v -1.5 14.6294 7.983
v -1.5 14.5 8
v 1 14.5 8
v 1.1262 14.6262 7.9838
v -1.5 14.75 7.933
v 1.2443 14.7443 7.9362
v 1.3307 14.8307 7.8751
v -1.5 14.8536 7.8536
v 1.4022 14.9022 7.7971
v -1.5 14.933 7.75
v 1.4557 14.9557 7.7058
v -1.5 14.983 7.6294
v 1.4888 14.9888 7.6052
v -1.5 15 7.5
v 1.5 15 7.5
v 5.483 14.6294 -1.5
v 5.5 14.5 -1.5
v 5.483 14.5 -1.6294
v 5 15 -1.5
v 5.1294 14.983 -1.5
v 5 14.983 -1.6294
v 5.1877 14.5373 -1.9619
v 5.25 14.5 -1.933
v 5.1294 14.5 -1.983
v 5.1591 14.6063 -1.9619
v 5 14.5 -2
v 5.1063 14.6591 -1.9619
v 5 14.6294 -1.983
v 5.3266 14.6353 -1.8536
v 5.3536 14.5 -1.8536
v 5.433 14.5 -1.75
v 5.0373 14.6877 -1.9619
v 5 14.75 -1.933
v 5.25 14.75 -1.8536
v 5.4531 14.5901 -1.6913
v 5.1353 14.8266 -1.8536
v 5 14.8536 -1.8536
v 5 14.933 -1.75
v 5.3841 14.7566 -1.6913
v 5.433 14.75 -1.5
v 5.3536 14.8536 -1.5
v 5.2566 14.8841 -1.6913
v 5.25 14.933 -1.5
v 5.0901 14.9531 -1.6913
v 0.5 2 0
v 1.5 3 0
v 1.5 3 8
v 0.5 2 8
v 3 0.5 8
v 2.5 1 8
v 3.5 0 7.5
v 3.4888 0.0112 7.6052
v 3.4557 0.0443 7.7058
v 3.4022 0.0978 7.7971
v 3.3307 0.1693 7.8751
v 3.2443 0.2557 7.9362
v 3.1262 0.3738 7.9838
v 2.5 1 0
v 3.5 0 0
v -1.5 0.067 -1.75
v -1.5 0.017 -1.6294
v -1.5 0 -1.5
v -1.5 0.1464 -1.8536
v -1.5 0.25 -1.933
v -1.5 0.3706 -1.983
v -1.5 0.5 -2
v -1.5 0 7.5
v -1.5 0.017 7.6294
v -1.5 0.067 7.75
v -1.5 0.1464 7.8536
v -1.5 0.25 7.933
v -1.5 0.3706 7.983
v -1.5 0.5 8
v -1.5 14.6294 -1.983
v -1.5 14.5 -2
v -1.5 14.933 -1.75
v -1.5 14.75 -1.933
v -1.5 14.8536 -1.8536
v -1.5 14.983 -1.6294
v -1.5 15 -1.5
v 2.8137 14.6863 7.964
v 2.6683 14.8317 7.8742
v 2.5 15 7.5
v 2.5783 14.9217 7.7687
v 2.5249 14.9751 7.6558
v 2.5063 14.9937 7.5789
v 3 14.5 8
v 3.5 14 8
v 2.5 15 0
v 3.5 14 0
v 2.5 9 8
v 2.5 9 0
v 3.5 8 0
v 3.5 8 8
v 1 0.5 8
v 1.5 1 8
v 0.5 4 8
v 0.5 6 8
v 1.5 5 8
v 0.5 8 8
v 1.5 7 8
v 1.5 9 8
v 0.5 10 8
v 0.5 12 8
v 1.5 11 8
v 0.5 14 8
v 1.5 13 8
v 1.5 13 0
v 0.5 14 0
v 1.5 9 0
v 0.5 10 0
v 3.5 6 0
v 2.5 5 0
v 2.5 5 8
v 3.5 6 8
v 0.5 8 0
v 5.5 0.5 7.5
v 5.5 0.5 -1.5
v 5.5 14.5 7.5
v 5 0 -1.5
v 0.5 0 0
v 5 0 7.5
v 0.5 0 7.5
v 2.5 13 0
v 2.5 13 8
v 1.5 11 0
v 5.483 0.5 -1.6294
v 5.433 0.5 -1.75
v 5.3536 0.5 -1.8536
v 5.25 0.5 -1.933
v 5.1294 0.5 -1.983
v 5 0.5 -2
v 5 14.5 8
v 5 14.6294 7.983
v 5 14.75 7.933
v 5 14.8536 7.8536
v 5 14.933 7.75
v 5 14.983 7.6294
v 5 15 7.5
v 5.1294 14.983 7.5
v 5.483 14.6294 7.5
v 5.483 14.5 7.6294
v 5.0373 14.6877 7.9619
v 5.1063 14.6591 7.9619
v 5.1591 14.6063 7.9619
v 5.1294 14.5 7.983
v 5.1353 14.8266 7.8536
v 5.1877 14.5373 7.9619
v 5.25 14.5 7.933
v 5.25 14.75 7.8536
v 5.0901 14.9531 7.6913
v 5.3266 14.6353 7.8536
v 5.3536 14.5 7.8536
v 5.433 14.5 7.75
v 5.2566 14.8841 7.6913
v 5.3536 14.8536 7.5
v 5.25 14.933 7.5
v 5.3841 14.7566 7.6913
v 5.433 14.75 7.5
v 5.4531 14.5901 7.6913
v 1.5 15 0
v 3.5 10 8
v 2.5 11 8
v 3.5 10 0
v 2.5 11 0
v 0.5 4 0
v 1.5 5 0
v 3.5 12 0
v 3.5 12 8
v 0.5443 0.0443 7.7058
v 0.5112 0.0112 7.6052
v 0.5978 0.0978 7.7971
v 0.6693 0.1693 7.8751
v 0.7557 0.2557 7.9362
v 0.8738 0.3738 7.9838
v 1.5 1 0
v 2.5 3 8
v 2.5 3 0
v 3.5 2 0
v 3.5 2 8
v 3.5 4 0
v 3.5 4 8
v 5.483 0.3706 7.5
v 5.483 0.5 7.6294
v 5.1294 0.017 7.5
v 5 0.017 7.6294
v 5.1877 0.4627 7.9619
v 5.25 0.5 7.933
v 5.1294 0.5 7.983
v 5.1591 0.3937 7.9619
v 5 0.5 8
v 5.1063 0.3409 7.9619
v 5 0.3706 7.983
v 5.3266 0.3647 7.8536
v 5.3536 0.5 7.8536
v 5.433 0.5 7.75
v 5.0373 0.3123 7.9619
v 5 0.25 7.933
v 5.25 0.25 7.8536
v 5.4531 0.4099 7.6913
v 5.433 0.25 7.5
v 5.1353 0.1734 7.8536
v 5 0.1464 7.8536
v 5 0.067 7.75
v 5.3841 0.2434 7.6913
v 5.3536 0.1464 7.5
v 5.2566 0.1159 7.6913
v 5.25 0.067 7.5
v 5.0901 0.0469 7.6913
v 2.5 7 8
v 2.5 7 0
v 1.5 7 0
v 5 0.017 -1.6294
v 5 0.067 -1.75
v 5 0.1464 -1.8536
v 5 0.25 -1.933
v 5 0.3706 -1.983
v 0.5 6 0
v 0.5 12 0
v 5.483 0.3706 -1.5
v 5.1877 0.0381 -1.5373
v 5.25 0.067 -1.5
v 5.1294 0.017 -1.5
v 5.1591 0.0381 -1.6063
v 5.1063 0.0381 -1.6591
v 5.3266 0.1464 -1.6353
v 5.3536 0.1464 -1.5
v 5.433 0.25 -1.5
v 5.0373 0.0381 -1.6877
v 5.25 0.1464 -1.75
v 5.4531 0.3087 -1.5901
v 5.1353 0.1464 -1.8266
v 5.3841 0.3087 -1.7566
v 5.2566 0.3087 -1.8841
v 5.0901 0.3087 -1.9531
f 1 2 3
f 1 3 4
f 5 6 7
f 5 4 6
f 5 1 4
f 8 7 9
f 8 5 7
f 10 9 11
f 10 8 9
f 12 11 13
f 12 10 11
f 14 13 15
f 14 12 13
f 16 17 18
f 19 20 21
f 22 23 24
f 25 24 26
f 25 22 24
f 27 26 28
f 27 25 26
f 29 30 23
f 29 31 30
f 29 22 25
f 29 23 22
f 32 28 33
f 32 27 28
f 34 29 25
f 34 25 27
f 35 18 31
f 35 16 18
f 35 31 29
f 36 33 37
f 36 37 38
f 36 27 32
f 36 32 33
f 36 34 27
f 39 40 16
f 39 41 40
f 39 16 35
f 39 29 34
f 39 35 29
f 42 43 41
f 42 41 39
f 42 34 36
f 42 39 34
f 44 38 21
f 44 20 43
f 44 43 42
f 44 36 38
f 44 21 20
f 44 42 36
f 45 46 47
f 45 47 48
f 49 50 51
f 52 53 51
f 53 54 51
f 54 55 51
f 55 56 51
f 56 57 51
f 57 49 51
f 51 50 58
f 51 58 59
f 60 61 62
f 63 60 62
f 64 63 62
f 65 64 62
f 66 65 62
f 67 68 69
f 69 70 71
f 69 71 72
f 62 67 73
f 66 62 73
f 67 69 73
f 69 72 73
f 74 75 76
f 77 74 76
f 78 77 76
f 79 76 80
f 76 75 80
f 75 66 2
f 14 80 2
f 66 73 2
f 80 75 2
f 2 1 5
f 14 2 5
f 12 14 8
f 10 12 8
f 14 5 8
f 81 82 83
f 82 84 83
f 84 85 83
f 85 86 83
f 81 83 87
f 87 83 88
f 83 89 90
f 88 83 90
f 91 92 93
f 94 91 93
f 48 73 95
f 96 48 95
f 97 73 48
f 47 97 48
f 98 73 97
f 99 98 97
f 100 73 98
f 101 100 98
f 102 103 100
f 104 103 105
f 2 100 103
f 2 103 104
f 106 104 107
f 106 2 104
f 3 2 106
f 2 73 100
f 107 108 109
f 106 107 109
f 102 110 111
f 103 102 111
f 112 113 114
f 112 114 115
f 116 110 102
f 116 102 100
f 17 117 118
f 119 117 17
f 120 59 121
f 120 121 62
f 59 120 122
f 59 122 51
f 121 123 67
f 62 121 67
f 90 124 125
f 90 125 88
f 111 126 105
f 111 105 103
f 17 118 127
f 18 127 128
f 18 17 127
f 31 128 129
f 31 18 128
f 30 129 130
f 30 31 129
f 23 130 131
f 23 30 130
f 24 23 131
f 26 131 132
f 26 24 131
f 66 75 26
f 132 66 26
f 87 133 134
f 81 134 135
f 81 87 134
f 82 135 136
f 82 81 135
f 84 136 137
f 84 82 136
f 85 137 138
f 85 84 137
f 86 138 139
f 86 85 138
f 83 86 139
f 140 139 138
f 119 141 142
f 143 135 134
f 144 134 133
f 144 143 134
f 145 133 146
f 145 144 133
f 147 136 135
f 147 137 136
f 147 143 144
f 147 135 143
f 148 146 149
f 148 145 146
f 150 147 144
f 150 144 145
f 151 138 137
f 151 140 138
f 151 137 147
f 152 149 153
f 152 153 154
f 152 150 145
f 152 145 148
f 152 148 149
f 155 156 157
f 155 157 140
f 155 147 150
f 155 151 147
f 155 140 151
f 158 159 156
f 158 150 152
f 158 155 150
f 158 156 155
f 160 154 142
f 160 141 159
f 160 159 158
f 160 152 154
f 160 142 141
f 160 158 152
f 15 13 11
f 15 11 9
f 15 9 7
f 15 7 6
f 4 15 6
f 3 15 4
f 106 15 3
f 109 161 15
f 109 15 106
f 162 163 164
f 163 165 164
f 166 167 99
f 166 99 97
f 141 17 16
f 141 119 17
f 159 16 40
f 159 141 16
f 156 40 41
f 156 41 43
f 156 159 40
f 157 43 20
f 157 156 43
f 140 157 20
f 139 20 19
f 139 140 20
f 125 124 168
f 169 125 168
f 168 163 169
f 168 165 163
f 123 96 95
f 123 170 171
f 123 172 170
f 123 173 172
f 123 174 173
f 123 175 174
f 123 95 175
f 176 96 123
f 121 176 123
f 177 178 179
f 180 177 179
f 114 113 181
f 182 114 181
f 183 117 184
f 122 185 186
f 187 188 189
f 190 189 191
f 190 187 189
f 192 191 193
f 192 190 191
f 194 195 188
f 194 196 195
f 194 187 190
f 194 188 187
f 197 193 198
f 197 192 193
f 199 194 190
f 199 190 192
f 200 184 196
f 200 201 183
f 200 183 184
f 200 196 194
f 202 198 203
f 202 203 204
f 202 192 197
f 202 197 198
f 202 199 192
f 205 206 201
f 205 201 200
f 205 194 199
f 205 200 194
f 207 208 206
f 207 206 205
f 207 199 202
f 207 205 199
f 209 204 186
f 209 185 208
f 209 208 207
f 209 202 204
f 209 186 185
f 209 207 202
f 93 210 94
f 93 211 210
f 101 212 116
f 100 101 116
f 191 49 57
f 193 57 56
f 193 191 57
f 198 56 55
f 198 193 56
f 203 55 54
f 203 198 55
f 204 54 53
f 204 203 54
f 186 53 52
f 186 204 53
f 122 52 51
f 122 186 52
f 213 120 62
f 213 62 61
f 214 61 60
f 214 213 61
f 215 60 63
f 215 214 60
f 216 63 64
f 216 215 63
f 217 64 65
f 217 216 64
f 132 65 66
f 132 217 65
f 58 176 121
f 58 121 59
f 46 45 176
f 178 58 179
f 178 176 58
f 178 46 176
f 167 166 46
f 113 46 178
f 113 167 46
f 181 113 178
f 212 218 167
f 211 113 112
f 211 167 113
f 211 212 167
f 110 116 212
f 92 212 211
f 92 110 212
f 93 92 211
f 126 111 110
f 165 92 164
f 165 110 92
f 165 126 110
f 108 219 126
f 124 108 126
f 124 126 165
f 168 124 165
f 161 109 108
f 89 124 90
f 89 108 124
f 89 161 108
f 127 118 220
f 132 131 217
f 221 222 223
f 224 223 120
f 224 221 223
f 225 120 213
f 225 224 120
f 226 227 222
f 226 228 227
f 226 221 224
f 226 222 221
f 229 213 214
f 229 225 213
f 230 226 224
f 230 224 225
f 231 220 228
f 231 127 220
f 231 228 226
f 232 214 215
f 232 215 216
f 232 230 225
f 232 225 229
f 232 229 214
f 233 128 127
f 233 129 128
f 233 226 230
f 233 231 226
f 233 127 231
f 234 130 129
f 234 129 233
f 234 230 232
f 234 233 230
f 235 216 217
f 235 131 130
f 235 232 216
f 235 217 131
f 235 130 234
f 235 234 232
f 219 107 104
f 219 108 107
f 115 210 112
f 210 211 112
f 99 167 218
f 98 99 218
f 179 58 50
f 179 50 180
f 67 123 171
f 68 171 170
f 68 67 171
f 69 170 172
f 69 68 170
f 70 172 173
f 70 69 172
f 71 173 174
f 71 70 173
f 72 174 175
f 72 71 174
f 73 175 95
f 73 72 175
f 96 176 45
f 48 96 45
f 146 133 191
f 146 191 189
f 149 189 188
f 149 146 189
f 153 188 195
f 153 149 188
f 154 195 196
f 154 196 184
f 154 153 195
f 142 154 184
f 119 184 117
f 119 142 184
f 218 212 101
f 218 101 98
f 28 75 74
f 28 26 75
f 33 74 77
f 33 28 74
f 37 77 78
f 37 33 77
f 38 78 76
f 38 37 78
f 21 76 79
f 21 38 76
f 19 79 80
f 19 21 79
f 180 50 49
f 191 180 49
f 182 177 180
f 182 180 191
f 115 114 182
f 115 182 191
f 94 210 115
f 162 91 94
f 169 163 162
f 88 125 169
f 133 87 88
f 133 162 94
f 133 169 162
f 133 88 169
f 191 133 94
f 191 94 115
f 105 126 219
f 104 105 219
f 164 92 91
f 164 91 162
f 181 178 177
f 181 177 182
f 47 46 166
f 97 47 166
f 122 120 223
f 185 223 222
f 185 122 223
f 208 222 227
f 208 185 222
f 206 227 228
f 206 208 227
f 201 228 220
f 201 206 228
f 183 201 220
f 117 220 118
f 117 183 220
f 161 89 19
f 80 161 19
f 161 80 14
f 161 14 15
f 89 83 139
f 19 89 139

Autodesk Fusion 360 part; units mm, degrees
sketch "Esquisse1" plane through (0, 0, 0) normal (0, 0, 1) x (1, 0, 0)
  line L0 (2, 0) -> (3.5, 0)
  line L1 (3.5, 0) -> (3.5, 15)
  line L2 (3.5, 15) -> (2, 15)
  line L3 (3.5, 0) -> (5.5, 0)
  line L4 (5.5, 0) -> (5.5, 15)
  line L5 (5.5, 15) -> (3.5, 15)
  line L6 (3.5, 15) -> (3.5, 0)
  line L7 (3.5, 15) -> (2.5, 15)
  line L8 (3.5, 15) -> (3.5, 14)
  line L9 (2.5, 15) -> (3.5, 14)
  line L10 (2.5, 13) -> (3.5, 14)
  line L11 (2.5, 13) -> (3.5, 12)
  line L12 (2.5, 11) -> (3.5, 12)
  line L13 (2.5, 7) -> (3.5, 8)
  line L14 (2.5, 9) -> (3.5, 8)
  line L15 (2.5, 9) -> (3.5, 10)
  line L16 (2.5, 11) -> (3.5, 10)
  line L17 (2.5, 1) -> (3.5, 0)
  line L18 (2.5, 1) -> (3.5, 2)
  line L19 (2.5, 3) -> (3.5, 2)
  line L20 (2.5, 3) -> (3.5, 4)
  line L21 (2.5, 5) -> (3.5, 4)
  line L22 (2.5, 5) -> (3.5, 6)
  line L23 (2.5, 7) -> (3.5, 6)
  line L24 (1.5, 7) -> (0.5, 8)
  line L25 (0.5, 15) -> (1.5, 15)
  line L26 (1.5, 9) -> (0.5, 8)
  line L27 (1.5, 15) -> (0.5, 14)
  line L28 (1.5, 11) -> (0.5, 10)
  line L29 (0.5, 15) -> (0.5, 14)
  line L30 (1.5, 1) -> (0.5, 0)
  line L31 (1.5, 5) -> (0.5, 4)
  line L32 (1.5, 3) -> (0.5, 2)
  line L33 (1.5, 7) -> (0.5, 6)
  line L34 (1.5, 13) -> (0.5, 12)
  line L35 (0.5, 0) -> (-1.5, 0)
  line L36 (1.5, 1) -> (0.5, 2)
  line L37 (1.5, 11) -> (0.5, 12)
  line L38 (1.5, 3) -> (0.5, 4)
  line L39 (1.5, 13) -> (0.5, 14)
  line L40 (1.5, 9) -> (0.5, 10)
  line L41 (1.5, 5) -> (0.5, 6)
  line L42 (0.5, 0) -> (0.5, 15)
  line L43 (-1.5, 15) -> (0.5, 15)
  line L44 (0.5, 15) -> (0.5, 0)
  line L45 (-1.5, 0) -> (-1.5, 15)
  line L46 (0.5, 15) -> (2, 15)
  line L47 (2, 0) -> (0.5, 0)
  dimension "d1" = 3.5
  dimension "d2" = 15
  dimension "d3" = 2
  dimension "d5" = 1
  dimension "d6" = 1
extrude "Extrusion1" add sketch "Esquisse1" against normal blind 2
extrude "Extrusion2" add sketch "Esquisse1" along normal blind 8 contours L1 L6 L17 L18 | L1 L3 L4 L5 L6 L8 | L30 L36 L42 L44 | L29 L35 L42 L43 L44 L45 | L1 L6 L19 L20 | L32 L38 L42 L44 | L1 L6 L21 L22 | L31 L41 L42 L44 | L1 L6 L13 L23 | L1 L2 L6 L7 L8 L9 | L25 L27 L29 L42 L44 L46 | L24 L33 L42 L44 | L1 L6 L14 L15 | L1 L6 L10 L11 | L34 L39 L42 L44 | L26 L40 L42 L44 | L1 L6 L12 L16 | L28 L37 L42 L44
fillet "Congé1" radius 0.5 10 edges at (5.5, 15, 3) (5.5, 7.5, -2) (2, 15, -2) (5.5, 0, 3) (2, 0, -2) (5.5, 7.5, 8) (4, 15, 8) (0, 15, 8) (4.5, 0, 8) (-0.5, 0, 8)
equation "d1 = ( 1.75 * 2 ) * 1 mm"
